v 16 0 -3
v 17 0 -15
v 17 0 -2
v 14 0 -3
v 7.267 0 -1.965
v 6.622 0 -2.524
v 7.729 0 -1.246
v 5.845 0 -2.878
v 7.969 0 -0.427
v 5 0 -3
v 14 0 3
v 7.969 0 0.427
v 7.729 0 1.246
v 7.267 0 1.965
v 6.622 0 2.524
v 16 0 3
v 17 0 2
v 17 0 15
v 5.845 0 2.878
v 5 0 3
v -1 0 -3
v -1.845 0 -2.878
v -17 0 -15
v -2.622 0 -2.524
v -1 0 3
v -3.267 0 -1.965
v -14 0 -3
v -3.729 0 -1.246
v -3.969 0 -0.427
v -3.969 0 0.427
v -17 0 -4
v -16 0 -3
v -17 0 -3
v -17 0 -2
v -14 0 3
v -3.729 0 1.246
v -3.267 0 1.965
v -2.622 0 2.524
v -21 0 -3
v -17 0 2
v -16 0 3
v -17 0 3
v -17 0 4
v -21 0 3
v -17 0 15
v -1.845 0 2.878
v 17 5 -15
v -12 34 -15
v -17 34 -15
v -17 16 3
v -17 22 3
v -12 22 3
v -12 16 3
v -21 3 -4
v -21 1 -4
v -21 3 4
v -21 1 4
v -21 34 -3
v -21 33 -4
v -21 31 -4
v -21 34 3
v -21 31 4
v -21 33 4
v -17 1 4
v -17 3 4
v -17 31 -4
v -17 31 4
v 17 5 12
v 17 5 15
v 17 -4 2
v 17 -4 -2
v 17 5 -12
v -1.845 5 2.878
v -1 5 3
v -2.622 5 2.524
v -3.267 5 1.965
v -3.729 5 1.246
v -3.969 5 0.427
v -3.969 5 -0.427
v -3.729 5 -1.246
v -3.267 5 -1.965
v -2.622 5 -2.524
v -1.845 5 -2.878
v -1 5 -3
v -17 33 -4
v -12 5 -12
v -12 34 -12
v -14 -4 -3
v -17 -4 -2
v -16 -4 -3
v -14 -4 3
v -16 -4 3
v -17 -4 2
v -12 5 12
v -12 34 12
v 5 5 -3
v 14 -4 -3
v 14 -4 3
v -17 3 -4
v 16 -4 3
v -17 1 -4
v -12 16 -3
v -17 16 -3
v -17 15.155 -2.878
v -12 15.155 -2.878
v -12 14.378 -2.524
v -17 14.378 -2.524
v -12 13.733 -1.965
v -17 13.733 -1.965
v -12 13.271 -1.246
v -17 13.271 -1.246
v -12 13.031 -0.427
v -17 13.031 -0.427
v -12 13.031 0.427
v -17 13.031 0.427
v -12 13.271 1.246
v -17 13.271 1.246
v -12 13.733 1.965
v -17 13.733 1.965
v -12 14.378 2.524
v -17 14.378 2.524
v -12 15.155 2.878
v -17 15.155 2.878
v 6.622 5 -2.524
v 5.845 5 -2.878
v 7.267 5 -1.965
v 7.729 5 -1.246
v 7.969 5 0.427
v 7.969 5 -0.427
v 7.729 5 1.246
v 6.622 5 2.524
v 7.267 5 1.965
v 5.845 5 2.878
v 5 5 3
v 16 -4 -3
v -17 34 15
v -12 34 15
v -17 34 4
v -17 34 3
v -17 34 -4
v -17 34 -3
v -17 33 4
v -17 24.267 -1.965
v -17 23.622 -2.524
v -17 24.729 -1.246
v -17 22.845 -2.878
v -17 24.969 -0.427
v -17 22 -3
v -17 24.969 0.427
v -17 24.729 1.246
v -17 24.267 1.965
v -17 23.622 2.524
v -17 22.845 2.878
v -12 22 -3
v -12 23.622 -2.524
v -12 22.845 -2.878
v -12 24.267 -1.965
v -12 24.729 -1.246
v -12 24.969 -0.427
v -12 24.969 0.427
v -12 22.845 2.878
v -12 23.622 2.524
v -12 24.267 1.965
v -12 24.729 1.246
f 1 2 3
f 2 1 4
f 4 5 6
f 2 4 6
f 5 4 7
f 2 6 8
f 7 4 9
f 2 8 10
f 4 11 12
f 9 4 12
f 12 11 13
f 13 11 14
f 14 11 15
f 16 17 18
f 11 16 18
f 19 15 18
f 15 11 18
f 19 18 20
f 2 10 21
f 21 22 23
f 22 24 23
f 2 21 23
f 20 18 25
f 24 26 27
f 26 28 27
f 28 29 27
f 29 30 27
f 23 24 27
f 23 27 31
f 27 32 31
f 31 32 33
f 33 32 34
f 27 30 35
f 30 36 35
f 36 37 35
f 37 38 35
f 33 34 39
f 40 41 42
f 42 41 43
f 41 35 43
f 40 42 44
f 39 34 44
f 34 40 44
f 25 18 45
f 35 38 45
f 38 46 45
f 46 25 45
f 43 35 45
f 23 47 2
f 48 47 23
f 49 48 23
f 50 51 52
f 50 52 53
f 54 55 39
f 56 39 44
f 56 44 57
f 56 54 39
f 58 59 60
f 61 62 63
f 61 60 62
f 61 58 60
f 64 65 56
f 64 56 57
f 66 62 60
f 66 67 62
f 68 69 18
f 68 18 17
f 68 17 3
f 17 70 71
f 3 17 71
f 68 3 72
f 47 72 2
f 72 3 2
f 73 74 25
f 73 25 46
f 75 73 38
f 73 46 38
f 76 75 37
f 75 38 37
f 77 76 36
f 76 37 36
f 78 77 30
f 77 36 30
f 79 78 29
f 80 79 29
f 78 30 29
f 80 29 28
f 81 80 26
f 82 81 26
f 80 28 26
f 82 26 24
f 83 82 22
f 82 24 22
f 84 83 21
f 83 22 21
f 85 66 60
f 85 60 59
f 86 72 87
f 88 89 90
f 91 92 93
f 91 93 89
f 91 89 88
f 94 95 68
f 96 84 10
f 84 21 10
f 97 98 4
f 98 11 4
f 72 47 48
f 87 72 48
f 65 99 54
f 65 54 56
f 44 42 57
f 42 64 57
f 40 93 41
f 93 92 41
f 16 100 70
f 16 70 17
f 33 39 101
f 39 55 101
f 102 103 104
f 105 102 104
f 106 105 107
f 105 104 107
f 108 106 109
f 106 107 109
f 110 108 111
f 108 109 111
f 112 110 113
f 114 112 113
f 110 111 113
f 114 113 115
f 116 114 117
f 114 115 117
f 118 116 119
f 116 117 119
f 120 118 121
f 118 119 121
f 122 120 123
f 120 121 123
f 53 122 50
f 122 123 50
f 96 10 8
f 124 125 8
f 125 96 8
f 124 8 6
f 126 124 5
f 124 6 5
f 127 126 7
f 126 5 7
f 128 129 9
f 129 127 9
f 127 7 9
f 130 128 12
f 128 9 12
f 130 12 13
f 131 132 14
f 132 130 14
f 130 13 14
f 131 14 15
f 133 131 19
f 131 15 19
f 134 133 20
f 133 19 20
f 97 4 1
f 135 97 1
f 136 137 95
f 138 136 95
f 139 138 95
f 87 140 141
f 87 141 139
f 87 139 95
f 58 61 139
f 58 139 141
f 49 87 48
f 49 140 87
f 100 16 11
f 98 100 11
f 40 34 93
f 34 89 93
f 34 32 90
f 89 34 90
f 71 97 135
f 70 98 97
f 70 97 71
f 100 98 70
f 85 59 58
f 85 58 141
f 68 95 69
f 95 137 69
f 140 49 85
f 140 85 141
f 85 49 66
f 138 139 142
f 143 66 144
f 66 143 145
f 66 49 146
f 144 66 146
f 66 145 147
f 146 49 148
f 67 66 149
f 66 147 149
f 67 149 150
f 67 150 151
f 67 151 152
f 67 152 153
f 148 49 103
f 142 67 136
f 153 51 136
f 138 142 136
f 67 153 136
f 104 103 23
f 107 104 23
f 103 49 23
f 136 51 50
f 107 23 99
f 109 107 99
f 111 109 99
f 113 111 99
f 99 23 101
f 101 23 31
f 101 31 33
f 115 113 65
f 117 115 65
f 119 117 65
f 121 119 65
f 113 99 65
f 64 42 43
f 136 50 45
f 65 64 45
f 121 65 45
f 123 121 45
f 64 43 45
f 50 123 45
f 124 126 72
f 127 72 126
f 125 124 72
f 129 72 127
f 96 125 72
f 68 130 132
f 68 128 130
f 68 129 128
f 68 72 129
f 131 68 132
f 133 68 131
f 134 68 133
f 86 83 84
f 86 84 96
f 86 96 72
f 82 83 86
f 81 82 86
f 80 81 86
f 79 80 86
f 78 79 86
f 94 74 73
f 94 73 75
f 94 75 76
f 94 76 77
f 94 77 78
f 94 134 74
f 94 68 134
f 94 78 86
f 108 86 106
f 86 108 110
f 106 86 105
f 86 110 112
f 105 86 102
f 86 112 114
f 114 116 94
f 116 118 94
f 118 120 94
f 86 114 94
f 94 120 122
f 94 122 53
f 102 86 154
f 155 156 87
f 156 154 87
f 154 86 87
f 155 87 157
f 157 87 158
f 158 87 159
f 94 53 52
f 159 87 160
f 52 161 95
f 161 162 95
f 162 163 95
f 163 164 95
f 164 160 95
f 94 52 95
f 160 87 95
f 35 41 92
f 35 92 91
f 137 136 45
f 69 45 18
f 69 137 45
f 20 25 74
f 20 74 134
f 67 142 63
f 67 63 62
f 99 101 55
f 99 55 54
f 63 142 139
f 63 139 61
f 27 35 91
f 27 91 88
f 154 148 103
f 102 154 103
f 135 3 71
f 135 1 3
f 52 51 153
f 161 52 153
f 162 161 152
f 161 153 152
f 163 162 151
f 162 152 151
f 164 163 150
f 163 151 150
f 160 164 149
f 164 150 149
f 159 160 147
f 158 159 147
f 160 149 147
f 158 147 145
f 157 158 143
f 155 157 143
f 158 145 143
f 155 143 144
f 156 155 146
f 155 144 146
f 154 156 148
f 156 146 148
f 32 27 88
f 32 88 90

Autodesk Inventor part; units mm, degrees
ref_plane "YZ Plane" through (0, 0, 0) normal (1, 0, 0) x (0, 1, 0)
ref_plane "XZ Plane" through (0, 0, 0) normal (0, 1, 0) x (-1, 0, 0)
ref_plane "XY Plane" through (0, 0, 0) normal (0, 0, 1) x (1, 0, 0)
sketch "Sketch1" plane through (0, 0, 0) normal (0, 1, 0) x (-1, 0, 0)
  line L0 (17, 15) -> (-17, 15)
  line L1 (-17, 15) -> (-17, -15)
  line L2 (-17, -15) -> (17, -15)
  line L3 (17, -15) -> (17, 15)
  line L4 (17, 15) -> (-17, -15) construction
  line L5 (-17, 15) -> (17, -15) construction
  circle A0 centre (-5, 0) radius 3
  circle A1 centre (1, 0) radius 3
  line L6 (1, 3) -> (-5, 3)
  line L7 (1, -3) -> (-5, -3)
  point P0 (0, 0)
  dimension "d0" = 34
  dimension "d1" = 30
  dimension "d2" = 6
  dimension "d3" = 12
  dimension "d4" = 6
  dimension "d5" = 18
extrude "Extrusion1" add sketch "Sketch1" along normal blind 5
sketch "Sketch2" plane through (-17, 0, -15) normal (-1, 0, 0) x (0, 0, 1)
  line L0 (30, 0) -> (0, 0) projected
  line L1 (0, 0) -> (30, 0)
  line L2 (30, 0) -> (30, 34)
  line L3 (30, 34) -> (0, 34)
  line L4 (0, 34) -> (0, 0)
  circle A0 centre (15, 16) radius 3
  circle A1 centre (15, 22) radius 3
  line L5 (12, 22) -> (12, 16)
  line L6 (18, 22) -> (18, 16)
  point P0 (15, 0)
  point P1 (15, 0)
  dimension "d8" = 34
  dimension "d9" = 6
  dimension "d10" = 6
  dimension "d11" = 0
  dimension "d12" = 0
  dimension "d13" = 6
  dimension "d15" = 12
extrude "Extrusion2" add sketch "Sketch2" against normal blind 5
sketch "Sketch3" plane through (17, 0, -15) normal (0, 0, -1) x (-1, 0, 0)
  line L0 (34, 34) -> (29, 34) projected
  line L1 (0, 5) -> (29, 34)
  line L2 (29, 34) -> (29, 5)
  line L3 (29, 5) -> (0, 5)
  point P0 (17, 0)
extrude "Extrusion3" add sketch "Sketch3" against normal blind 3
mirror "Mirror1" about plane through (0, 0, 0) normal (0, 0, 1) of "Extrusion3"
sketch "Sketch4" plane through (0, 0, 0) normal (0, -1, 0) x (1, 0, 0)
  line L0 (20, 3) -> (14, 3)
  line L1 (14, 3) -> (14, -3)
  line L2 (14, -3) -> (20, -3)
  line L3 (20, -3) -> (20, 3)
  line L4 (17, 15) -> (17, -15) projected
  line L5 (20, 3) -> (14, -3) construction
  line L6 (14, 3) -> (20, -3) construction
  line L7 (17, 3) -> (17, -3)
  line L8 (-20, 3) -> (-14, 3)
  line L9 (-14, 3) -> (-14, -3)
  line L10 (-14, -3) -> (-20, -3)
  line L11 (-20, -3) -> (-20, 3)
  line L12 (-17, -3) -> (-17, 3) projected
  line L13 (-20, 3) -> (-14, -3) construction
  line L14 (-14, 3) -> (-20, -3) construction
  line L15 (-17, 3) -> (-17, -3)
  line L16 (-17, -15) -> (-17, 15) projected
  point P0 (0, 0)
  point P1 (17, 0)
  point P2 (-17, 0)
  dimension "d20" = 6
  dimension "d21" = 6
  dimension "d22" = 6
  dimension "d23" = 6
extrude "Extrusion4" add sketch "Sketch4" along normal blind 4 contours L4 L2 L1 L0 | L8 L9 L10 L12
chamfer "Chamfer1" distance 1 angle 45 4 edges at (17, -2, 3) (17, -2, -3) (-17, -2, -3) (-17, -2, 3)
sketch "Sketch5" plane through (-17, 34, -15) normal (-1, 0, 0) x (0, 0, 1)
  line L0 (11, 3) -> (19, 3)
  line L1 (19, 3) -> (19, -3)
  line L2 (19, -3) -> (11, -3)
  line L3 (11, -3) -> (11, 3)
  line L4 (30, 0) -> (0, 0) projected
  line L5 (11, 3) -> (19, -3) construction
  line L6 (19, 3) -> (11, -3) construction
  line L7 (11, -31) -> (19, -31)
  line L8 (19, -31) -> (19, -37)
  line L9 (19, -37) -> (11, -37)
  line L10 (11, -37) -> (11, -31)
  line L11 (11, -31) -> (19, -37) construction
  line L12 (19, -31) -> (11, -37) construction
  line L13 (11, 0) -> (19, 0)
  line L14 (0, -34) -> (13, -34) projected
  line L15 (11, -34) -> (19, -34)
  point P0 (15, -34)
  point P1 (15, 0)
  dimension "d29" = 8
  dimension "d30" = 6
  dimension "d31" = 8
  dimension "d32" = 6
extrude "Extrusion5" add sketch "Sketch5" along normal blind 4 contours L4 L1 L2 L3 | L7 L8 L15 L14 L10
chamfer "Chamfer2" distance 1 angle 45 4 edges at (-19, 0, -4) (-19, 0, 4) (-19, 34, 4) (-19, 34, -4)
properties part number "L"
